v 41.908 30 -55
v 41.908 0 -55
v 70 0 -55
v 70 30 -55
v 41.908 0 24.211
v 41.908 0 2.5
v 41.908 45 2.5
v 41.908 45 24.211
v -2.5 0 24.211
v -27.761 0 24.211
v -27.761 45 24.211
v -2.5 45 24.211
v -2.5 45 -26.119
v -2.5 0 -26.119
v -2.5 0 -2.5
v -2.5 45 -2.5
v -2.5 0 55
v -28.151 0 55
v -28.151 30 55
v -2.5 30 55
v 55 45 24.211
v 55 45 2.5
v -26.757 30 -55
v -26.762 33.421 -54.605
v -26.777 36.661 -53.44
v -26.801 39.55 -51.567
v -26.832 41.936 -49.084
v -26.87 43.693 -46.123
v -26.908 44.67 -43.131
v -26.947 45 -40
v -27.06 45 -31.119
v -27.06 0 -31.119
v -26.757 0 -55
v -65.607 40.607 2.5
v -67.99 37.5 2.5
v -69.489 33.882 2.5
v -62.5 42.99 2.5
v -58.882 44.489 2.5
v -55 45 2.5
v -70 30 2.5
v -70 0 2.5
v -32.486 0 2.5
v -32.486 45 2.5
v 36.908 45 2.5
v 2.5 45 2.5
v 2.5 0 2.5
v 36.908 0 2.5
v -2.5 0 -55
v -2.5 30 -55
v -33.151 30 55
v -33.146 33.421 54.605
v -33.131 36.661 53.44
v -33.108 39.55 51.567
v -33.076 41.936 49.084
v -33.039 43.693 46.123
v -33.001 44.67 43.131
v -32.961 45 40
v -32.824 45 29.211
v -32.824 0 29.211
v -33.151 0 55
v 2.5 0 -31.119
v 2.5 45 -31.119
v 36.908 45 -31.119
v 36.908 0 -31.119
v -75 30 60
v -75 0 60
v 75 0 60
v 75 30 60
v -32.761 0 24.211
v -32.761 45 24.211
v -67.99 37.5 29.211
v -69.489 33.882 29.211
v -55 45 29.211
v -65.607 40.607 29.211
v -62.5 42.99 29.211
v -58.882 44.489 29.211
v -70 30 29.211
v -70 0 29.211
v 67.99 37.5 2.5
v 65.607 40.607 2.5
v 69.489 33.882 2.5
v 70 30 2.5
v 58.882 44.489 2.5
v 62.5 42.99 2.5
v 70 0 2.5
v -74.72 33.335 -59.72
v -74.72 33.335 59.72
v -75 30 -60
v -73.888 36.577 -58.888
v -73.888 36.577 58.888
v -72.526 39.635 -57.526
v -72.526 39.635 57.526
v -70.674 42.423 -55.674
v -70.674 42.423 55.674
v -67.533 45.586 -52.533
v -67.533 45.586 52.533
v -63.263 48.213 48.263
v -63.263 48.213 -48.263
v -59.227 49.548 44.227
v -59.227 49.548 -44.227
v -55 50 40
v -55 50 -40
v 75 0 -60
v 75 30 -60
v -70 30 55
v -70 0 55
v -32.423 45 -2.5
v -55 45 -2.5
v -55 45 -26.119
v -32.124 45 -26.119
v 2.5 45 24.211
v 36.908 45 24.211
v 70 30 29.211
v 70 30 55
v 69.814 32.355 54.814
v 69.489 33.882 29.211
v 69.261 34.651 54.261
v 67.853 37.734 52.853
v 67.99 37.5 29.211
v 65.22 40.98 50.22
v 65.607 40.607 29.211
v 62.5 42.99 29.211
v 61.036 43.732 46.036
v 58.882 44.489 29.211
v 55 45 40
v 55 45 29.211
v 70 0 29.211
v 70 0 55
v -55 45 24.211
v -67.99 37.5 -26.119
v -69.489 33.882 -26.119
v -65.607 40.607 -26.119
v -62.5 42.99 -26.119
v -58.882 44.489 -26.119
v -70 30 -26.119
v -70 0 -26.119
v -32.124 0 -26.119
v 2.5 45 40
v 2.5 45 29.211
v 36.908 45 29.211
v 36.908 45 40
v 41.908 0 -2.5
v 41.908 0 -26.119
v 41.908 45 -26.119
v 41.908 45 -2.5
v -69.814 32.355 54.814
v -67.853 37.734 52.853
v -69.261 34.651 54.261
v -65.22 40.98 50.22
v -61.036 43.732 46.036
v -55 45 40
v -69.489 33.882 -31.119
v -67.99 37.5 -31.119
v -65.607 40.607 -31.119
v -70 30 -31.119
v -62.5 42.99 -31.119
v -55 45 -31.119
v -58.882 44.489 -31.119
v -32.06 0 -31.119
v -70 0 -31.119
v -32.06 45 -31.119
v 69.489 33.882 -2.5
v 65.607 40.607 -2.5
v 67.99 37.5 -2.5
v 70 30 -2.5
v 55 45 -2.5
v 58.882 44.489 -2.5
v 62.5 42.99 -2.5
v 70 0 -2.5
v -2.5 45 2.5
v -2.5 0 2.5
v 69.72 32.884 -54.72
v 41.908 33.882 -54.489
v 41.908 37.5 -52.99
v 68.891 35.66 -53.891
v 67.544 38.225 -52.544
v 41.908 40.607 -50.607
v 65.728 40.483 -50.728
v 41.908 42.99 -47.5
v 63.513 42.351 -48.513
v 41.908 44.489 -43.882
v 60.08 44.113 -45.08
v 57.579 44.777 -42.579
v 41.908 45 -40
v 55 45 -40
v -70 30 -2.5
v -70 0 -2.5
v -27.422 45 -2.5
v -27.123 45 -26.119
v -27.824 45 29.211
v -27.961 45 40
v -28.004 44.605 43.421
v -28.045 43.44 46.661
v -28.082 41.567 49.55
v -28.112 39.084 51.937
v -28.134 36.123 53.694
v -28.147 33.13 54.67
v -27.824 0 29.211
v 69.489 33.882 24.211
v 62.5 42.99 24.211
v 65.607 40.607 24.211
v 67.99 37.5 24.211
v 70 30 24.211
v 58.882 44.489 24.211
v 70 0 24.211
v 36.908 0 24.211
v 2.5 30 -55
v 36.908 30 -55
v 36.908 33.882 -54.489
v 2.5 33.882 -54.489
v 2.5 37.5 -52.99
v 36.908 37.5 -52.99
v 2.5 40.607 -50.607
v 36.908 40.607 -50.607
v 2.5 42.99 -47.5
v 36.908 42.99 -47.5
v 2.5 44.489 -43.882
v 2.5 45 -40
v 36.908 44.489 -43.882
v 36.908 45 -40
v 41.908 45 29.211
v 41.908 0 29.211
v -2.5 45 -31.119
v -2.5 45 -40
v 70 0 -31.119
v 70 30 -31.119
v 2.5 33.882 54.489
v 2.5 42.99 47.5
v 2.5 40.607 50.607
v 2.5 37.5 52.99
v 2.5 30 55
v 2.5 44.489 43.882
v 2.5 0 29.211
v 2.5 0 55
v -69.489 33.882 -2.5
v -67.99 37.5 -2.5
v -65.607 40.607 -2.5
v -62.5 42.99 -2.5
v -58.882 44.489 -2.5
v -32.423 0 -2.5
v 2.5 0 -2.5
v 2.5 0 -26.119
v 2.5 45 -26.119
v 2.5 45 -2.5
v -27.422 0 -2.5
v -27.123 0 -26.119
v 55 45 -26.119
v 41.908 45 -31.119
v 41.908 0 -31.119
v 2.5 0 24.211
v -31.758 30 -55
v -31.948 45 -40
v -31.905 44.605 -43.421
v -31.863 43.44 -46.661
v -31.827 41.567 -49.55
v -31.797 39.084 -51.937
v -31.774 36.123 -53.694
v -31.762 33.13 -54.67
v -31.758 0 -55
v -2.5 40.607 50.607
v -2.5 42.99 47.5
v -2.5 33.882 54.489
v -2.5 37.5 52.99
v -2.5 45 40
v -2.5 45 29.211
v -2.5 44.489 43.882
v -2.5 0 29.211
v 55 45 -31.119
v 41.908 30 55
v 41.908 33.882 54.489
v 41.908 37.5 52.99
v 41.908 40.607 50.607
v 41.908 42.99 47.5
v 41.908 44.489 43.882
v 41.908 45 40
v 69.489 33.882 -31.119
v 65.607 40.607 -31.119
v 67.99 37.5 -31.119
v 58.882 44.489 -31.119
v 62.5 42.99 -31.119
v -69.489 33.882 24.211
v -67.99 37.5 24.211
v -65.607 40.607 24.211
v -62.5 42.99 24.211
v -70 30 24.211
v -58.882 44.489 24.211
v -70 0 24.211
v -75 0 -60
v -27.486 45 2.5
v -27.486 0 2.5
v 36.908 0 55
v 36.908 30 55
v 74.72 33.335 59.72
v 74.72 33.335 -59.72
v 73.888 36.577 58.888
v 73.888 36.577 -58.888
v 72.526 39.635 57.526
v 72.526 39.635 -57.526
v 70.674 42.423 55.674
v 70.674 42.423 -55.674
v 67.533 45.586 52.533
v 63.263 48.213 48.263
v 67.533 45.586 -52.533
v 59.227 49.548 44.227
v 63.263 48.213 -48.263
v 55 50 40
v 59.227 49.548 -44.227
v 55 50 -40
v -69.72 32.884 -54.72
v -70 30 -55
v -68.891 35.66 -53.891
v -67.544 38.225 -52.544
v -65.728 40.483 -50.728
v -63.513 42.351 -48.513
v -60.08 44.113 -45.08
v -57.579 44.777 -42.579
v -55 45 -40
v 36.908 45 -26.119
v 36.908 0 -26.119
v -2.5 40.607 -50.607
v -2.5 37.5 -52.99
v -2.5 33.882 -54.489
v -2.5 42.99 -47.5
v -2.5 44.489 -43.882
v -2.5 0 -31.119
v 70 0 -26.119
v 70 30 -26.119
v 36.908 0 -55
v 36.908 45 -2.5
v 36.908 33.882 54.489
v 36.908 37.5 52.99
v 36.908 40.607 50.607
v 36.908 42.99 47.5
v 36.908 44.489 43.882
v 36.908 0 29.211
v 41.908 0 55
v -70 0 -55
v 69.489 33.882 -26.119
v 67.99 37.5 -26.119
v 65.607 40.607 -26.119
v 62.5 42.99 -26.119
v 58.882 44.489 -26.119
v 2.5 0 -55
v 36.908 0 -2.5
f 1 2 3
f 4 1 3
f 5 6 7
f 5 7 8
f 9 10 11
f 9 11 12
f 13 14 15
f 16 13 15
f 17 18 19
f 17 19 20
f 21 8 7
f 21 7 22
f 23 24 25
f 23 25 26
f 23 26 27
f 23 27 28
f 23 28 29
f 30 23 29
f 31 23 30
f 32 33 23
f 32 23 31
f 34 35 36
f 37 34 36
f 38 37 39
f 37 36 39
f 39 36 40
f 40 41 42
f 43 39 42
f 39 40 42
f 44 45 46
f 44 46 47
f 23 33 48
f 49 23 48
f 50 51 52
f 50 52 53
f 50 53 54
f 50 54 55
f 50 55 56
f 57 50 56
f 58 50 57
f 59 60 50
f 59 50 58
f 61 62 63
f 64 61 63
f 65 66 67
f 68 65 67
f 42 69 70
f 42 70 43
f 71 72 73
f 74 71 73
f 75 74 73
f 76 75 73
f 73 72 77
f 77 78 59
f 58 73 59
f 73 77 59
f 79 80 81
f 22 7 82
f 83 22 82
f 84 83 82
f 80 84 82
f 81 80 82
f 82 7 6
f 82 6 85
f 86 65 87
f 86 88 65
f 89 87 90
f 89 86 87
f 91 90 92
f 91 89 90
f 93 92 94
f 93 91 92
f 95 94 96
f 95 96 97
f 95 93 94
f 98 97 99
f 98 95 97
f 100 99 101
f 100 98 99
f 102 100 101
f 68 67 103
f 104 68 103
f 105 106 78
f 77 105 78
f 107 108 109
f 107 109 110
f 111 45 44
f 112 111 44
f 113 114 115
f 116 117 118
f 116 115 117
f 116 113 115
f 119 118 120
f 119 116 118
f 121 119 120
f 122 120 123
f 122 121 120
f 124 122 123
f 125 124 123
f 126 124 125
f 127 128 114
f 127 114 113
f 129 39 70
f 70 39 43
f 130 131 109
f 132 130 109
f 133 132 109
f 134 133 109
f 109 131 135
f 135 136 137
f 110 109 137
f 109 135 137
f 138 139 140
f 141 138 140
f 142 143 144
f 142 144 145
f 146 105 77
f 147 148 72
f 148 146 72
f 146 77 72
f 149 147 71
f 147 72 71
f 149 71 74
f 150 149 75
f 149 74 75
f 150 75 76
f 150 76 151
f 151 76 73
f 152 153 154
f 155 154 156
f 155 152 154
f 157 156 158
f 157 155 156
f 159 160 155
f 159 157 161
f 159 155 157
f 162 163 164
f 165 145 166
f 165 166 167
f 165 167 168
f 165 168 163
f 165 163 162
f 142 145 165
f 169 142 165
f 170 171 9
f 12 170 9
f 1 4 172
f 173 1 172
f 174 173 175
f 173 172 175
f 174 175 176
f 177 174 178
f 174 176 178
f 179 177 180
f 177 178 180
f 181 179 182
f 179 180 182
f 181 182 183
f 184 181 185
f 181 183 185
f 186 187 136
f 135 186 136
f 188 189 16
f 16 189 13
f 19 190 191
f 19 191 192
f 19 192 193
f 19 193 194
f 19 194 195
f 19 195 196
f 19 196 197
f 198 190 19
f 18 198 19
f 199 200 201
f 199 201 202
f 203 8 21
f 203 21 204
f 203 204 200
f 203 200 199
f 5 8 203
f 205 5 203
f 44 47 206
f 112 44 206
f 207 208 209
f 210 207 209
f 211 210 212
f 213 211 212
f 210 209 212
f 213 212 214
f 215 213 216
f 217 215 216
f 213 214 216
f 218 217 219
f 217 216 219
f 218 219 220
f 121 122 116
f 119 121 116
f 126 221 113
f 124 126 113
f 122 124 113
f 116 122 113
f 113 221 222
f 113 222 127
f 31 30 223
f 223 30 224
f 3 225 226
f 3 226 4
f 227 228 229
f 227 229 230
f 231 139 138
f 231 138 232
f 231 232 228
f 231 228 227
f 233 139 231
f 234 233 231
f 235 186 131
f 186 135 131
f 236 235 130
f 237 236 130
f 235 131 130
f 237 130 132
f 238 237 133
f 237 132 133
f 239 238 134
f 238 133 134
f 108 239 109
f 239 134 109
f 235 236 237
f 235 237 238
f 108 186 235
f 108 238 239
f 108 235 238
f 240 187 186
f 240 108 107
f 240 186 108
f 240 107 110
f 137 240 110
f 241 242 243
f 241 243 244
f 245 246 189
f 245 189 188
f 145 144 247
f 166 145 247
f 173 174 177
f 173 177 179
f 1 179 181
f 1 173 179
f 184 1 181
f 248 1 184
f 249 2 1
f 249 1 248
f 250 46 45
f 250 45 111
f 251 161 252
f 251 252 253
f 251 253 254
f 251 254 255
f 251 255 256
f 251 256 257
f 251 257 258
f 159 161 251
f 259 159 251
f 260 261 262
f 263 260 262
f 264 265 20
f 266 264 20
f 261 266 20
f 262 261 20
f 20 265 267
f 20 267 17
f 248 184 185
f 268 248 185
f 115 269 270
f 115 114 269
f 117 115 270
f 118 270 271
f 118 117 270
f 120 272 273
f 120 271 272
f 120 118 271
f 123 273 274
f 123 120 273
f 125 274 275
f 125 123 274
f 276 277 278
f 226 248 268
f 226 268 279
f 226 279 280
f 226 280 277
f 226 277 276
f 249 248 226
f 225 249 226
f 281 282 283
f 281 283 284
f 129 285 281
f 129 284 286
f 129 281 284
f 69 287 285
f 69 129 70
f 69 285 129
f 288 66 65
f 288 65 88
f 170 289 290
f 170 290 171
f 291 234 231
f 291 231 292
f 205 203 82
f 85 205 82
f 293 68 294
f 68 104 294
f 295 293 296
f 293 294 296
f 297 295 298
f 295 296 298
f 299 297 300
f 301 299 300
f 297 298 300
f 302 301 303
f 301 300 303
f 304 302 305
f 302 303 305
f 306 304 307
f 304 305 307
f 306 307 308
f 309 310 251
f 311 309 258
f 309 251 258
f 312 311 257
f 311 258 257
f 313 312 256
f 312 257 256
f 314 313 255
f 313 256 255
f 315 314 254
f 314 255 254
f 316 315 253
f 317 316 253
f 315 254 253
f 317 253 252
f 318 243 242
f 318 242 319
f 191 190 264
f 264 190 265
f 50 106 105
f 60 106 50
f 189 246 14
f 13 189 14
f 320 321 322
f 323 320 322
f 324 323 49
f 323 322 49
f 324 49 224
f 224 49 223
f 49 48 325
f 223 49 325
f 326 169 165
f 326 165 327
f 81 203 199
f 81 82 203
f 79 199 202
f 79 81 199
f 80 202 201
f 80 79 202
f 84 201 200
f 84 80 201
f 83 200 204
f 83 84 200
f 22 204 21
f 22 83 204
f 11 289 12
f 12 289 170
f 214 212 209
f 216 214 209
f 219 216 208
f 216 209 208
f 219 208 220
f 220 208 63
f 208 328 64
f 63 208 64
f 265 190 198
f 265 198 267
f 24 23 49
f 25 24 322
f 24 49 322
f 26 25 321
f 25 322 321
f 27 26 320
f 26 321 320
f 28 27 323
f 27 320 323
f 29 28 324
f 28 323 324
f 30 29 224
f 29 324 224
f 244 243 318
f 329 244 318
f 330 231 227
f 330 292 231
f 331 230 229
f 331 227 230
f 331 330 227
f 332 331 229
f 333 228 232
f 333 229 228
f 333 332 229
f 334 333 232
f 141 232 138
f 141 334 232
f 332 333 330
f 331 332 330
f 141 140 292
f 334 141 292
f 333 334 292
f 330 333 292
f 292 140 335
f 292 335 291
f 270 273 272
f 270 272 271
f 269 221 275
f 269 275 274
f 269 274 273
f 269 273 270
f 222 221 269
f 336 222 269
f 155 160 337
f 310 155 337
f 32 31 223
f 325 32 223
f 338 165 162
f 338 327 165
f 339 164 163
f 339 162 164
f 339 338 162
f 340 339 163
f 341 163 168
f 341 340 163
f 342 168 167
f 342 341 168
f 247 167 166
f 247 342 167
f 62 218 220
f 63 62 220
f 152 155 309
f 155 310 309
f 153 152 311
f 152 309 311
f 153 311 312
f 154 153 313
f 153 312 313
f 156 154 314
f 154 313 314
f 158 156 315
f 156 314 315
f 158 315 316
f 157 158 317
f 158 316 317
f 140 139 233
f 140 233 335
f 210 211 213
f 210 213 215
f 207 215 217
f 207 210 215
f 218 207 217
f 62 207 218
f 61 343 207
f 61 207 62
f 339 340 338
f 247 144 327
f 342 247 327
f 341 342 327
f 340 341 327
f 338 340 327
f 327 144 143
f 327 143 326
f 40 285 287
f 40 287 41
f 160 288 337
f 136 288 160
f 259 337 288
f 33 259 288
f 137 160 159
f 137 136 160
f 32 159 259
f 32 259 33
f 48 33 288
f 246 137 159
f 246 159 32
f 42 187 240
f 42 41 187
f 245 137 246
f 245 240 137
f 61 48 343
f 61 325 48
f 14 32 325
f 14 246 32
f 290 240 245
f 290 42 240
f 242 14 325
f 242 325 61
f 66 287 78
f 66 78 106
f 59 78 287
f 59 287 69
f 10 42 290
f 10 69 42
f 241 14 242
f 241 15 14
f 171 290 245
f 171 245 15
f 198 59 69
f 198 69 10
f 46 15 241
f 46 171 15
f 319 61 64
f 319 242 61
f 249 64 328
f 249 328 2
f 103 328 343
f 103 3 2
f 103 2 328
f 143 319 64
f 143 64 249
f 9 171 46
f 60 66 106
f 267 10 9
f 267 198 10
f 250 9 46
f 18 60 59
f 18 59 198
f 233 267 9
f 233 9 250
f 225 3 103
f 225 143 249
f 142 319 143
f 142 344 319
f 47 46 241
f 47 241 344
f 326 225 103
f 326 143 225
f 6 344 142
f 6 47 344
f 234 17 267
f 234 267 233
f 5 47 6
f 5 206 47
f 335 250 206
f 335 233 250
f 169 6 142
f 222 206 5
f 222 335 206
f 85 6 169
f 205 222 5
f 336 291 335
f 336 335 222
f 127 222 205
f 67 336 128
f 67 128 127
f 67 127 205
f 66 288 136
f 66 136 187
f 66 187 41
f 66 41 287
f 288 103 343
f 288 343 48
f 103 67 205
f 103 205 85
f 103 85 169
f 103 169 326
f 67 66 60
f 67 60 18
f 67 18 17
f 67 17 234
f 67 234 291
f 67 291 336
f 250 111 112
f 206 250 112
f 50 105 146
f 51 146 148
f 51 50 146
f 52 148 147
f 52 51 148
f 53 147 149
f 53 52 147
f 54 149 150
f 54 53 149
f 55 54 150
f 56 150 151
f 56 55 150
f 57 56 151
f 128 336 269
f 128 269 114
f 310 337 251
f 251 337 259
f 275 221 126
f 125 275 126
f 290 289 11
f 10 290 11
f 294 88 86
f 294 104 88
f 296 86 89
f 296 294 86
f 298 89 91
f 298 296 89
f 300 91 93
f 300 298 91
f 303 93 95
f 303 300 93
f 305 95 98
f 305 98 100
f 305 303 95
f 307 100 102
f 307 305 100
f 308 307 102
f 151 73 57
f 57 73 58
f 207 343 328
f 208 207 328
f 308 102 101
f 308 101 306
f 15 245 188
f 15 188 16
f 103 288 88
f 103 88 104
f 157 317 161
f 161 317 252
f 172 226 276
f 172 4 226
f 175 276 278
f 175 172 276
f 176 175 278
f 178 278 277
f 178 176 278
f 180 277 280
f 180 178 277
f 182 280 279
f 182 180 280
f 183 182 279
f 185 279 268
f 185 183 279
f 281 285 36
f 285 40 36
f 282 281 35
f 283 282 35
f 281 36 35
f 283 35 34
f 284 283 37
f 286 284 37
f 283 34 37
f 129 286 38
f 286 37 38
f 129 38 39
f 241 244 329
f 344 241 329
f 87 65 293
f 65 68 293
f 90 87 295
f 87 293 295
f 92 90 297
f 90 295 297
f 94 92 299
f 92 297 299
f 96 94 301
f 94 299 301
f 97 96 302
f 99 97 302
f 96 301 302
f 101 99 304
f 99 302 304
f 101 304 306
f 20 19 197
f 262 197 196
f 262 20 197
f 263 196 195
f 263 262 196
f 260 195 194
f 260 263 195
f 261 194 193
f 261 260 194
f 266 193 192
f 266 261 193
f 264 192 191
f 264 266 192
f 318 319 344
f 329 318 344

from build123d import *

# Parameters (mm, degrees)
SKETCH1_W           = 150
SKETCH1_H           = 120
BOSS_EXTRUDE1_DEPTH = 50
FILLET1_R           = 20
SHELL1_T            = -5
RIB1_REACH          = 110.282
SKETCH2_WALLS_W     = 358.564078278
SKETCH2_WALLS_H     = 5
SKETCH2_WALLS_W_2   = 360.016478266
SKETCH2_WALLS_W_3   = 5
SKETCH2_WALLS_H_2   = 328.564078278


with BuildPart() as part:
    # Sketch1 → Boss-Extrude1 (new body)
    with BuildSketch(Plane(origin=(0, 0, 0), x_dir=(1, 0, 0), z_dir=(0, 1, 0))):
        Rectangle(SKETCH1_W, SKETCH1_H)
    extrude(amount=BOSS_EXTRUDE1_DEPTH)

    # Fillet1
    fillet1_edges = [part.edges().sort_by_distance(p)[0] for p in [
        (-75, 50, 0),
        (0, 50, 60),
        (75, 50, 0),
        (0, 50, -60),
    ]]
    fillet(fillet1_edges, radius=FILLET1_R)

    # Shell1
    shell1_openings = [part.faces().sort_by_distance(p)[0] for p in [
        (0, 0, 0),
    ]]
    offset(amount=SHELL1_T, openings=shell1_openings)

    # Sketch2 walls → Rib1 (add, up to next)
    with BuildSketch(Plane.XZ, mode=Mode.PRIVATE) as rib1_sk1:
        with Locations((0, -28.619344042)):
            Rectangle(SKETCH2_WALLS_W, SKETCH2_WALLS_H)
    rib1_tool1 = extrude(rib1_sk1.sketch, amount=-RIB1_REACH, mode=Mode.PRIVATE) - part.part
    # Sketch2 walls → Rib1 (add, up to next)
    with BuildSketch(Plane.XZ, mode=Mode.PRIVATE) as rib1_sk2:
        Rectangle(SKETCH2_WALLS_W, SKETCH2_WALLS_H)
    rib1_tool2 = extrude(rib1_sk2.sketch, amount=-RIB1_REACH, mode=Mode.PRIVATE) - part.part
    # Sketch2 walls → Rib1 (add, up to next)
    with BuildSketch(Plane.XZ, mode=Mode.PRIVATE) as rib1_sk3:
        with Locations((0.726199994, 26.711483804)):
            Rectangle(SKETCH2_WALLS_W_2, SKETCH2_WALLS_H)
    rib1_tool3 = extrude(rib1_sk3.sketch, amount=-RIB1_REACH, mode=Mode.PRIVATE) - part.part
    # Sketch2 walls → Rib1 (add, up to next)
    with BuildSketch(Plane.XZ, mode=Mode.PRIVATE) as rib1_sk4:
        Rectangle(SKETCH2_WALLS_W_3, SKETCH2_WALLS_H_2)
    rib1_tool4 = extrude(rib1_sk4.sketch, amount=-RIB1_REACH, mode=Mode.PRIVATE) - part.part
    # Sketch2 walls → Rib1 (add, up to next)
    with BuildSketch(Plane.XZ, mode=Mode.PRIVATE) as rib1_sk5:
        Polygon((-34.534707577, 164.241613139), (-30.373449631, -164.304936346), (-25.37385063, -164.241613139), (-29.535108576, 164.304936346), align=None)
    rib1_tool5 = extrude(rib1_sk5.sketch, amount=-RIB1_REACH, mode=Mode.PRIVATE) - part.part
    # Sketch2 walls → Rib1 (add, up to next)
    with BuildSketch(Plane.XZ, mode=Mode.PRIVATE) as rib1_sk6:
        with Locations((39.408287459, 0)):
            Rectangle(SKETCH2_WALLS_W_3, SKETCH2_WALLS_H_2)
    rib1_tool6 = extrude(rib1_sk6.sketch, amount=-RIB1_REACH, mode=Mode.PRIVATE) - part.part
    add(rib1_tool1.solids().sort_by_distance((0, 0, -28.619344042))[0])
    add(rib1_tool2.solids().sort_by_distance((0, 0, 0))[0])
    add(rib1_tool3.solids().sort_by_distance((0.726199994, 0, 26.711483804))[0])
    add(rib1_tool4.solids().sort_by_distance((0, 0, 0))[0])
    add(rib1_tool5.solids().sort_by_distance((-29.954279104, 0, 0))[0])
    add(rib1_tool6.solids().sort_by_distance((39.408287459, 0, 0))[0])


solid = part.part
